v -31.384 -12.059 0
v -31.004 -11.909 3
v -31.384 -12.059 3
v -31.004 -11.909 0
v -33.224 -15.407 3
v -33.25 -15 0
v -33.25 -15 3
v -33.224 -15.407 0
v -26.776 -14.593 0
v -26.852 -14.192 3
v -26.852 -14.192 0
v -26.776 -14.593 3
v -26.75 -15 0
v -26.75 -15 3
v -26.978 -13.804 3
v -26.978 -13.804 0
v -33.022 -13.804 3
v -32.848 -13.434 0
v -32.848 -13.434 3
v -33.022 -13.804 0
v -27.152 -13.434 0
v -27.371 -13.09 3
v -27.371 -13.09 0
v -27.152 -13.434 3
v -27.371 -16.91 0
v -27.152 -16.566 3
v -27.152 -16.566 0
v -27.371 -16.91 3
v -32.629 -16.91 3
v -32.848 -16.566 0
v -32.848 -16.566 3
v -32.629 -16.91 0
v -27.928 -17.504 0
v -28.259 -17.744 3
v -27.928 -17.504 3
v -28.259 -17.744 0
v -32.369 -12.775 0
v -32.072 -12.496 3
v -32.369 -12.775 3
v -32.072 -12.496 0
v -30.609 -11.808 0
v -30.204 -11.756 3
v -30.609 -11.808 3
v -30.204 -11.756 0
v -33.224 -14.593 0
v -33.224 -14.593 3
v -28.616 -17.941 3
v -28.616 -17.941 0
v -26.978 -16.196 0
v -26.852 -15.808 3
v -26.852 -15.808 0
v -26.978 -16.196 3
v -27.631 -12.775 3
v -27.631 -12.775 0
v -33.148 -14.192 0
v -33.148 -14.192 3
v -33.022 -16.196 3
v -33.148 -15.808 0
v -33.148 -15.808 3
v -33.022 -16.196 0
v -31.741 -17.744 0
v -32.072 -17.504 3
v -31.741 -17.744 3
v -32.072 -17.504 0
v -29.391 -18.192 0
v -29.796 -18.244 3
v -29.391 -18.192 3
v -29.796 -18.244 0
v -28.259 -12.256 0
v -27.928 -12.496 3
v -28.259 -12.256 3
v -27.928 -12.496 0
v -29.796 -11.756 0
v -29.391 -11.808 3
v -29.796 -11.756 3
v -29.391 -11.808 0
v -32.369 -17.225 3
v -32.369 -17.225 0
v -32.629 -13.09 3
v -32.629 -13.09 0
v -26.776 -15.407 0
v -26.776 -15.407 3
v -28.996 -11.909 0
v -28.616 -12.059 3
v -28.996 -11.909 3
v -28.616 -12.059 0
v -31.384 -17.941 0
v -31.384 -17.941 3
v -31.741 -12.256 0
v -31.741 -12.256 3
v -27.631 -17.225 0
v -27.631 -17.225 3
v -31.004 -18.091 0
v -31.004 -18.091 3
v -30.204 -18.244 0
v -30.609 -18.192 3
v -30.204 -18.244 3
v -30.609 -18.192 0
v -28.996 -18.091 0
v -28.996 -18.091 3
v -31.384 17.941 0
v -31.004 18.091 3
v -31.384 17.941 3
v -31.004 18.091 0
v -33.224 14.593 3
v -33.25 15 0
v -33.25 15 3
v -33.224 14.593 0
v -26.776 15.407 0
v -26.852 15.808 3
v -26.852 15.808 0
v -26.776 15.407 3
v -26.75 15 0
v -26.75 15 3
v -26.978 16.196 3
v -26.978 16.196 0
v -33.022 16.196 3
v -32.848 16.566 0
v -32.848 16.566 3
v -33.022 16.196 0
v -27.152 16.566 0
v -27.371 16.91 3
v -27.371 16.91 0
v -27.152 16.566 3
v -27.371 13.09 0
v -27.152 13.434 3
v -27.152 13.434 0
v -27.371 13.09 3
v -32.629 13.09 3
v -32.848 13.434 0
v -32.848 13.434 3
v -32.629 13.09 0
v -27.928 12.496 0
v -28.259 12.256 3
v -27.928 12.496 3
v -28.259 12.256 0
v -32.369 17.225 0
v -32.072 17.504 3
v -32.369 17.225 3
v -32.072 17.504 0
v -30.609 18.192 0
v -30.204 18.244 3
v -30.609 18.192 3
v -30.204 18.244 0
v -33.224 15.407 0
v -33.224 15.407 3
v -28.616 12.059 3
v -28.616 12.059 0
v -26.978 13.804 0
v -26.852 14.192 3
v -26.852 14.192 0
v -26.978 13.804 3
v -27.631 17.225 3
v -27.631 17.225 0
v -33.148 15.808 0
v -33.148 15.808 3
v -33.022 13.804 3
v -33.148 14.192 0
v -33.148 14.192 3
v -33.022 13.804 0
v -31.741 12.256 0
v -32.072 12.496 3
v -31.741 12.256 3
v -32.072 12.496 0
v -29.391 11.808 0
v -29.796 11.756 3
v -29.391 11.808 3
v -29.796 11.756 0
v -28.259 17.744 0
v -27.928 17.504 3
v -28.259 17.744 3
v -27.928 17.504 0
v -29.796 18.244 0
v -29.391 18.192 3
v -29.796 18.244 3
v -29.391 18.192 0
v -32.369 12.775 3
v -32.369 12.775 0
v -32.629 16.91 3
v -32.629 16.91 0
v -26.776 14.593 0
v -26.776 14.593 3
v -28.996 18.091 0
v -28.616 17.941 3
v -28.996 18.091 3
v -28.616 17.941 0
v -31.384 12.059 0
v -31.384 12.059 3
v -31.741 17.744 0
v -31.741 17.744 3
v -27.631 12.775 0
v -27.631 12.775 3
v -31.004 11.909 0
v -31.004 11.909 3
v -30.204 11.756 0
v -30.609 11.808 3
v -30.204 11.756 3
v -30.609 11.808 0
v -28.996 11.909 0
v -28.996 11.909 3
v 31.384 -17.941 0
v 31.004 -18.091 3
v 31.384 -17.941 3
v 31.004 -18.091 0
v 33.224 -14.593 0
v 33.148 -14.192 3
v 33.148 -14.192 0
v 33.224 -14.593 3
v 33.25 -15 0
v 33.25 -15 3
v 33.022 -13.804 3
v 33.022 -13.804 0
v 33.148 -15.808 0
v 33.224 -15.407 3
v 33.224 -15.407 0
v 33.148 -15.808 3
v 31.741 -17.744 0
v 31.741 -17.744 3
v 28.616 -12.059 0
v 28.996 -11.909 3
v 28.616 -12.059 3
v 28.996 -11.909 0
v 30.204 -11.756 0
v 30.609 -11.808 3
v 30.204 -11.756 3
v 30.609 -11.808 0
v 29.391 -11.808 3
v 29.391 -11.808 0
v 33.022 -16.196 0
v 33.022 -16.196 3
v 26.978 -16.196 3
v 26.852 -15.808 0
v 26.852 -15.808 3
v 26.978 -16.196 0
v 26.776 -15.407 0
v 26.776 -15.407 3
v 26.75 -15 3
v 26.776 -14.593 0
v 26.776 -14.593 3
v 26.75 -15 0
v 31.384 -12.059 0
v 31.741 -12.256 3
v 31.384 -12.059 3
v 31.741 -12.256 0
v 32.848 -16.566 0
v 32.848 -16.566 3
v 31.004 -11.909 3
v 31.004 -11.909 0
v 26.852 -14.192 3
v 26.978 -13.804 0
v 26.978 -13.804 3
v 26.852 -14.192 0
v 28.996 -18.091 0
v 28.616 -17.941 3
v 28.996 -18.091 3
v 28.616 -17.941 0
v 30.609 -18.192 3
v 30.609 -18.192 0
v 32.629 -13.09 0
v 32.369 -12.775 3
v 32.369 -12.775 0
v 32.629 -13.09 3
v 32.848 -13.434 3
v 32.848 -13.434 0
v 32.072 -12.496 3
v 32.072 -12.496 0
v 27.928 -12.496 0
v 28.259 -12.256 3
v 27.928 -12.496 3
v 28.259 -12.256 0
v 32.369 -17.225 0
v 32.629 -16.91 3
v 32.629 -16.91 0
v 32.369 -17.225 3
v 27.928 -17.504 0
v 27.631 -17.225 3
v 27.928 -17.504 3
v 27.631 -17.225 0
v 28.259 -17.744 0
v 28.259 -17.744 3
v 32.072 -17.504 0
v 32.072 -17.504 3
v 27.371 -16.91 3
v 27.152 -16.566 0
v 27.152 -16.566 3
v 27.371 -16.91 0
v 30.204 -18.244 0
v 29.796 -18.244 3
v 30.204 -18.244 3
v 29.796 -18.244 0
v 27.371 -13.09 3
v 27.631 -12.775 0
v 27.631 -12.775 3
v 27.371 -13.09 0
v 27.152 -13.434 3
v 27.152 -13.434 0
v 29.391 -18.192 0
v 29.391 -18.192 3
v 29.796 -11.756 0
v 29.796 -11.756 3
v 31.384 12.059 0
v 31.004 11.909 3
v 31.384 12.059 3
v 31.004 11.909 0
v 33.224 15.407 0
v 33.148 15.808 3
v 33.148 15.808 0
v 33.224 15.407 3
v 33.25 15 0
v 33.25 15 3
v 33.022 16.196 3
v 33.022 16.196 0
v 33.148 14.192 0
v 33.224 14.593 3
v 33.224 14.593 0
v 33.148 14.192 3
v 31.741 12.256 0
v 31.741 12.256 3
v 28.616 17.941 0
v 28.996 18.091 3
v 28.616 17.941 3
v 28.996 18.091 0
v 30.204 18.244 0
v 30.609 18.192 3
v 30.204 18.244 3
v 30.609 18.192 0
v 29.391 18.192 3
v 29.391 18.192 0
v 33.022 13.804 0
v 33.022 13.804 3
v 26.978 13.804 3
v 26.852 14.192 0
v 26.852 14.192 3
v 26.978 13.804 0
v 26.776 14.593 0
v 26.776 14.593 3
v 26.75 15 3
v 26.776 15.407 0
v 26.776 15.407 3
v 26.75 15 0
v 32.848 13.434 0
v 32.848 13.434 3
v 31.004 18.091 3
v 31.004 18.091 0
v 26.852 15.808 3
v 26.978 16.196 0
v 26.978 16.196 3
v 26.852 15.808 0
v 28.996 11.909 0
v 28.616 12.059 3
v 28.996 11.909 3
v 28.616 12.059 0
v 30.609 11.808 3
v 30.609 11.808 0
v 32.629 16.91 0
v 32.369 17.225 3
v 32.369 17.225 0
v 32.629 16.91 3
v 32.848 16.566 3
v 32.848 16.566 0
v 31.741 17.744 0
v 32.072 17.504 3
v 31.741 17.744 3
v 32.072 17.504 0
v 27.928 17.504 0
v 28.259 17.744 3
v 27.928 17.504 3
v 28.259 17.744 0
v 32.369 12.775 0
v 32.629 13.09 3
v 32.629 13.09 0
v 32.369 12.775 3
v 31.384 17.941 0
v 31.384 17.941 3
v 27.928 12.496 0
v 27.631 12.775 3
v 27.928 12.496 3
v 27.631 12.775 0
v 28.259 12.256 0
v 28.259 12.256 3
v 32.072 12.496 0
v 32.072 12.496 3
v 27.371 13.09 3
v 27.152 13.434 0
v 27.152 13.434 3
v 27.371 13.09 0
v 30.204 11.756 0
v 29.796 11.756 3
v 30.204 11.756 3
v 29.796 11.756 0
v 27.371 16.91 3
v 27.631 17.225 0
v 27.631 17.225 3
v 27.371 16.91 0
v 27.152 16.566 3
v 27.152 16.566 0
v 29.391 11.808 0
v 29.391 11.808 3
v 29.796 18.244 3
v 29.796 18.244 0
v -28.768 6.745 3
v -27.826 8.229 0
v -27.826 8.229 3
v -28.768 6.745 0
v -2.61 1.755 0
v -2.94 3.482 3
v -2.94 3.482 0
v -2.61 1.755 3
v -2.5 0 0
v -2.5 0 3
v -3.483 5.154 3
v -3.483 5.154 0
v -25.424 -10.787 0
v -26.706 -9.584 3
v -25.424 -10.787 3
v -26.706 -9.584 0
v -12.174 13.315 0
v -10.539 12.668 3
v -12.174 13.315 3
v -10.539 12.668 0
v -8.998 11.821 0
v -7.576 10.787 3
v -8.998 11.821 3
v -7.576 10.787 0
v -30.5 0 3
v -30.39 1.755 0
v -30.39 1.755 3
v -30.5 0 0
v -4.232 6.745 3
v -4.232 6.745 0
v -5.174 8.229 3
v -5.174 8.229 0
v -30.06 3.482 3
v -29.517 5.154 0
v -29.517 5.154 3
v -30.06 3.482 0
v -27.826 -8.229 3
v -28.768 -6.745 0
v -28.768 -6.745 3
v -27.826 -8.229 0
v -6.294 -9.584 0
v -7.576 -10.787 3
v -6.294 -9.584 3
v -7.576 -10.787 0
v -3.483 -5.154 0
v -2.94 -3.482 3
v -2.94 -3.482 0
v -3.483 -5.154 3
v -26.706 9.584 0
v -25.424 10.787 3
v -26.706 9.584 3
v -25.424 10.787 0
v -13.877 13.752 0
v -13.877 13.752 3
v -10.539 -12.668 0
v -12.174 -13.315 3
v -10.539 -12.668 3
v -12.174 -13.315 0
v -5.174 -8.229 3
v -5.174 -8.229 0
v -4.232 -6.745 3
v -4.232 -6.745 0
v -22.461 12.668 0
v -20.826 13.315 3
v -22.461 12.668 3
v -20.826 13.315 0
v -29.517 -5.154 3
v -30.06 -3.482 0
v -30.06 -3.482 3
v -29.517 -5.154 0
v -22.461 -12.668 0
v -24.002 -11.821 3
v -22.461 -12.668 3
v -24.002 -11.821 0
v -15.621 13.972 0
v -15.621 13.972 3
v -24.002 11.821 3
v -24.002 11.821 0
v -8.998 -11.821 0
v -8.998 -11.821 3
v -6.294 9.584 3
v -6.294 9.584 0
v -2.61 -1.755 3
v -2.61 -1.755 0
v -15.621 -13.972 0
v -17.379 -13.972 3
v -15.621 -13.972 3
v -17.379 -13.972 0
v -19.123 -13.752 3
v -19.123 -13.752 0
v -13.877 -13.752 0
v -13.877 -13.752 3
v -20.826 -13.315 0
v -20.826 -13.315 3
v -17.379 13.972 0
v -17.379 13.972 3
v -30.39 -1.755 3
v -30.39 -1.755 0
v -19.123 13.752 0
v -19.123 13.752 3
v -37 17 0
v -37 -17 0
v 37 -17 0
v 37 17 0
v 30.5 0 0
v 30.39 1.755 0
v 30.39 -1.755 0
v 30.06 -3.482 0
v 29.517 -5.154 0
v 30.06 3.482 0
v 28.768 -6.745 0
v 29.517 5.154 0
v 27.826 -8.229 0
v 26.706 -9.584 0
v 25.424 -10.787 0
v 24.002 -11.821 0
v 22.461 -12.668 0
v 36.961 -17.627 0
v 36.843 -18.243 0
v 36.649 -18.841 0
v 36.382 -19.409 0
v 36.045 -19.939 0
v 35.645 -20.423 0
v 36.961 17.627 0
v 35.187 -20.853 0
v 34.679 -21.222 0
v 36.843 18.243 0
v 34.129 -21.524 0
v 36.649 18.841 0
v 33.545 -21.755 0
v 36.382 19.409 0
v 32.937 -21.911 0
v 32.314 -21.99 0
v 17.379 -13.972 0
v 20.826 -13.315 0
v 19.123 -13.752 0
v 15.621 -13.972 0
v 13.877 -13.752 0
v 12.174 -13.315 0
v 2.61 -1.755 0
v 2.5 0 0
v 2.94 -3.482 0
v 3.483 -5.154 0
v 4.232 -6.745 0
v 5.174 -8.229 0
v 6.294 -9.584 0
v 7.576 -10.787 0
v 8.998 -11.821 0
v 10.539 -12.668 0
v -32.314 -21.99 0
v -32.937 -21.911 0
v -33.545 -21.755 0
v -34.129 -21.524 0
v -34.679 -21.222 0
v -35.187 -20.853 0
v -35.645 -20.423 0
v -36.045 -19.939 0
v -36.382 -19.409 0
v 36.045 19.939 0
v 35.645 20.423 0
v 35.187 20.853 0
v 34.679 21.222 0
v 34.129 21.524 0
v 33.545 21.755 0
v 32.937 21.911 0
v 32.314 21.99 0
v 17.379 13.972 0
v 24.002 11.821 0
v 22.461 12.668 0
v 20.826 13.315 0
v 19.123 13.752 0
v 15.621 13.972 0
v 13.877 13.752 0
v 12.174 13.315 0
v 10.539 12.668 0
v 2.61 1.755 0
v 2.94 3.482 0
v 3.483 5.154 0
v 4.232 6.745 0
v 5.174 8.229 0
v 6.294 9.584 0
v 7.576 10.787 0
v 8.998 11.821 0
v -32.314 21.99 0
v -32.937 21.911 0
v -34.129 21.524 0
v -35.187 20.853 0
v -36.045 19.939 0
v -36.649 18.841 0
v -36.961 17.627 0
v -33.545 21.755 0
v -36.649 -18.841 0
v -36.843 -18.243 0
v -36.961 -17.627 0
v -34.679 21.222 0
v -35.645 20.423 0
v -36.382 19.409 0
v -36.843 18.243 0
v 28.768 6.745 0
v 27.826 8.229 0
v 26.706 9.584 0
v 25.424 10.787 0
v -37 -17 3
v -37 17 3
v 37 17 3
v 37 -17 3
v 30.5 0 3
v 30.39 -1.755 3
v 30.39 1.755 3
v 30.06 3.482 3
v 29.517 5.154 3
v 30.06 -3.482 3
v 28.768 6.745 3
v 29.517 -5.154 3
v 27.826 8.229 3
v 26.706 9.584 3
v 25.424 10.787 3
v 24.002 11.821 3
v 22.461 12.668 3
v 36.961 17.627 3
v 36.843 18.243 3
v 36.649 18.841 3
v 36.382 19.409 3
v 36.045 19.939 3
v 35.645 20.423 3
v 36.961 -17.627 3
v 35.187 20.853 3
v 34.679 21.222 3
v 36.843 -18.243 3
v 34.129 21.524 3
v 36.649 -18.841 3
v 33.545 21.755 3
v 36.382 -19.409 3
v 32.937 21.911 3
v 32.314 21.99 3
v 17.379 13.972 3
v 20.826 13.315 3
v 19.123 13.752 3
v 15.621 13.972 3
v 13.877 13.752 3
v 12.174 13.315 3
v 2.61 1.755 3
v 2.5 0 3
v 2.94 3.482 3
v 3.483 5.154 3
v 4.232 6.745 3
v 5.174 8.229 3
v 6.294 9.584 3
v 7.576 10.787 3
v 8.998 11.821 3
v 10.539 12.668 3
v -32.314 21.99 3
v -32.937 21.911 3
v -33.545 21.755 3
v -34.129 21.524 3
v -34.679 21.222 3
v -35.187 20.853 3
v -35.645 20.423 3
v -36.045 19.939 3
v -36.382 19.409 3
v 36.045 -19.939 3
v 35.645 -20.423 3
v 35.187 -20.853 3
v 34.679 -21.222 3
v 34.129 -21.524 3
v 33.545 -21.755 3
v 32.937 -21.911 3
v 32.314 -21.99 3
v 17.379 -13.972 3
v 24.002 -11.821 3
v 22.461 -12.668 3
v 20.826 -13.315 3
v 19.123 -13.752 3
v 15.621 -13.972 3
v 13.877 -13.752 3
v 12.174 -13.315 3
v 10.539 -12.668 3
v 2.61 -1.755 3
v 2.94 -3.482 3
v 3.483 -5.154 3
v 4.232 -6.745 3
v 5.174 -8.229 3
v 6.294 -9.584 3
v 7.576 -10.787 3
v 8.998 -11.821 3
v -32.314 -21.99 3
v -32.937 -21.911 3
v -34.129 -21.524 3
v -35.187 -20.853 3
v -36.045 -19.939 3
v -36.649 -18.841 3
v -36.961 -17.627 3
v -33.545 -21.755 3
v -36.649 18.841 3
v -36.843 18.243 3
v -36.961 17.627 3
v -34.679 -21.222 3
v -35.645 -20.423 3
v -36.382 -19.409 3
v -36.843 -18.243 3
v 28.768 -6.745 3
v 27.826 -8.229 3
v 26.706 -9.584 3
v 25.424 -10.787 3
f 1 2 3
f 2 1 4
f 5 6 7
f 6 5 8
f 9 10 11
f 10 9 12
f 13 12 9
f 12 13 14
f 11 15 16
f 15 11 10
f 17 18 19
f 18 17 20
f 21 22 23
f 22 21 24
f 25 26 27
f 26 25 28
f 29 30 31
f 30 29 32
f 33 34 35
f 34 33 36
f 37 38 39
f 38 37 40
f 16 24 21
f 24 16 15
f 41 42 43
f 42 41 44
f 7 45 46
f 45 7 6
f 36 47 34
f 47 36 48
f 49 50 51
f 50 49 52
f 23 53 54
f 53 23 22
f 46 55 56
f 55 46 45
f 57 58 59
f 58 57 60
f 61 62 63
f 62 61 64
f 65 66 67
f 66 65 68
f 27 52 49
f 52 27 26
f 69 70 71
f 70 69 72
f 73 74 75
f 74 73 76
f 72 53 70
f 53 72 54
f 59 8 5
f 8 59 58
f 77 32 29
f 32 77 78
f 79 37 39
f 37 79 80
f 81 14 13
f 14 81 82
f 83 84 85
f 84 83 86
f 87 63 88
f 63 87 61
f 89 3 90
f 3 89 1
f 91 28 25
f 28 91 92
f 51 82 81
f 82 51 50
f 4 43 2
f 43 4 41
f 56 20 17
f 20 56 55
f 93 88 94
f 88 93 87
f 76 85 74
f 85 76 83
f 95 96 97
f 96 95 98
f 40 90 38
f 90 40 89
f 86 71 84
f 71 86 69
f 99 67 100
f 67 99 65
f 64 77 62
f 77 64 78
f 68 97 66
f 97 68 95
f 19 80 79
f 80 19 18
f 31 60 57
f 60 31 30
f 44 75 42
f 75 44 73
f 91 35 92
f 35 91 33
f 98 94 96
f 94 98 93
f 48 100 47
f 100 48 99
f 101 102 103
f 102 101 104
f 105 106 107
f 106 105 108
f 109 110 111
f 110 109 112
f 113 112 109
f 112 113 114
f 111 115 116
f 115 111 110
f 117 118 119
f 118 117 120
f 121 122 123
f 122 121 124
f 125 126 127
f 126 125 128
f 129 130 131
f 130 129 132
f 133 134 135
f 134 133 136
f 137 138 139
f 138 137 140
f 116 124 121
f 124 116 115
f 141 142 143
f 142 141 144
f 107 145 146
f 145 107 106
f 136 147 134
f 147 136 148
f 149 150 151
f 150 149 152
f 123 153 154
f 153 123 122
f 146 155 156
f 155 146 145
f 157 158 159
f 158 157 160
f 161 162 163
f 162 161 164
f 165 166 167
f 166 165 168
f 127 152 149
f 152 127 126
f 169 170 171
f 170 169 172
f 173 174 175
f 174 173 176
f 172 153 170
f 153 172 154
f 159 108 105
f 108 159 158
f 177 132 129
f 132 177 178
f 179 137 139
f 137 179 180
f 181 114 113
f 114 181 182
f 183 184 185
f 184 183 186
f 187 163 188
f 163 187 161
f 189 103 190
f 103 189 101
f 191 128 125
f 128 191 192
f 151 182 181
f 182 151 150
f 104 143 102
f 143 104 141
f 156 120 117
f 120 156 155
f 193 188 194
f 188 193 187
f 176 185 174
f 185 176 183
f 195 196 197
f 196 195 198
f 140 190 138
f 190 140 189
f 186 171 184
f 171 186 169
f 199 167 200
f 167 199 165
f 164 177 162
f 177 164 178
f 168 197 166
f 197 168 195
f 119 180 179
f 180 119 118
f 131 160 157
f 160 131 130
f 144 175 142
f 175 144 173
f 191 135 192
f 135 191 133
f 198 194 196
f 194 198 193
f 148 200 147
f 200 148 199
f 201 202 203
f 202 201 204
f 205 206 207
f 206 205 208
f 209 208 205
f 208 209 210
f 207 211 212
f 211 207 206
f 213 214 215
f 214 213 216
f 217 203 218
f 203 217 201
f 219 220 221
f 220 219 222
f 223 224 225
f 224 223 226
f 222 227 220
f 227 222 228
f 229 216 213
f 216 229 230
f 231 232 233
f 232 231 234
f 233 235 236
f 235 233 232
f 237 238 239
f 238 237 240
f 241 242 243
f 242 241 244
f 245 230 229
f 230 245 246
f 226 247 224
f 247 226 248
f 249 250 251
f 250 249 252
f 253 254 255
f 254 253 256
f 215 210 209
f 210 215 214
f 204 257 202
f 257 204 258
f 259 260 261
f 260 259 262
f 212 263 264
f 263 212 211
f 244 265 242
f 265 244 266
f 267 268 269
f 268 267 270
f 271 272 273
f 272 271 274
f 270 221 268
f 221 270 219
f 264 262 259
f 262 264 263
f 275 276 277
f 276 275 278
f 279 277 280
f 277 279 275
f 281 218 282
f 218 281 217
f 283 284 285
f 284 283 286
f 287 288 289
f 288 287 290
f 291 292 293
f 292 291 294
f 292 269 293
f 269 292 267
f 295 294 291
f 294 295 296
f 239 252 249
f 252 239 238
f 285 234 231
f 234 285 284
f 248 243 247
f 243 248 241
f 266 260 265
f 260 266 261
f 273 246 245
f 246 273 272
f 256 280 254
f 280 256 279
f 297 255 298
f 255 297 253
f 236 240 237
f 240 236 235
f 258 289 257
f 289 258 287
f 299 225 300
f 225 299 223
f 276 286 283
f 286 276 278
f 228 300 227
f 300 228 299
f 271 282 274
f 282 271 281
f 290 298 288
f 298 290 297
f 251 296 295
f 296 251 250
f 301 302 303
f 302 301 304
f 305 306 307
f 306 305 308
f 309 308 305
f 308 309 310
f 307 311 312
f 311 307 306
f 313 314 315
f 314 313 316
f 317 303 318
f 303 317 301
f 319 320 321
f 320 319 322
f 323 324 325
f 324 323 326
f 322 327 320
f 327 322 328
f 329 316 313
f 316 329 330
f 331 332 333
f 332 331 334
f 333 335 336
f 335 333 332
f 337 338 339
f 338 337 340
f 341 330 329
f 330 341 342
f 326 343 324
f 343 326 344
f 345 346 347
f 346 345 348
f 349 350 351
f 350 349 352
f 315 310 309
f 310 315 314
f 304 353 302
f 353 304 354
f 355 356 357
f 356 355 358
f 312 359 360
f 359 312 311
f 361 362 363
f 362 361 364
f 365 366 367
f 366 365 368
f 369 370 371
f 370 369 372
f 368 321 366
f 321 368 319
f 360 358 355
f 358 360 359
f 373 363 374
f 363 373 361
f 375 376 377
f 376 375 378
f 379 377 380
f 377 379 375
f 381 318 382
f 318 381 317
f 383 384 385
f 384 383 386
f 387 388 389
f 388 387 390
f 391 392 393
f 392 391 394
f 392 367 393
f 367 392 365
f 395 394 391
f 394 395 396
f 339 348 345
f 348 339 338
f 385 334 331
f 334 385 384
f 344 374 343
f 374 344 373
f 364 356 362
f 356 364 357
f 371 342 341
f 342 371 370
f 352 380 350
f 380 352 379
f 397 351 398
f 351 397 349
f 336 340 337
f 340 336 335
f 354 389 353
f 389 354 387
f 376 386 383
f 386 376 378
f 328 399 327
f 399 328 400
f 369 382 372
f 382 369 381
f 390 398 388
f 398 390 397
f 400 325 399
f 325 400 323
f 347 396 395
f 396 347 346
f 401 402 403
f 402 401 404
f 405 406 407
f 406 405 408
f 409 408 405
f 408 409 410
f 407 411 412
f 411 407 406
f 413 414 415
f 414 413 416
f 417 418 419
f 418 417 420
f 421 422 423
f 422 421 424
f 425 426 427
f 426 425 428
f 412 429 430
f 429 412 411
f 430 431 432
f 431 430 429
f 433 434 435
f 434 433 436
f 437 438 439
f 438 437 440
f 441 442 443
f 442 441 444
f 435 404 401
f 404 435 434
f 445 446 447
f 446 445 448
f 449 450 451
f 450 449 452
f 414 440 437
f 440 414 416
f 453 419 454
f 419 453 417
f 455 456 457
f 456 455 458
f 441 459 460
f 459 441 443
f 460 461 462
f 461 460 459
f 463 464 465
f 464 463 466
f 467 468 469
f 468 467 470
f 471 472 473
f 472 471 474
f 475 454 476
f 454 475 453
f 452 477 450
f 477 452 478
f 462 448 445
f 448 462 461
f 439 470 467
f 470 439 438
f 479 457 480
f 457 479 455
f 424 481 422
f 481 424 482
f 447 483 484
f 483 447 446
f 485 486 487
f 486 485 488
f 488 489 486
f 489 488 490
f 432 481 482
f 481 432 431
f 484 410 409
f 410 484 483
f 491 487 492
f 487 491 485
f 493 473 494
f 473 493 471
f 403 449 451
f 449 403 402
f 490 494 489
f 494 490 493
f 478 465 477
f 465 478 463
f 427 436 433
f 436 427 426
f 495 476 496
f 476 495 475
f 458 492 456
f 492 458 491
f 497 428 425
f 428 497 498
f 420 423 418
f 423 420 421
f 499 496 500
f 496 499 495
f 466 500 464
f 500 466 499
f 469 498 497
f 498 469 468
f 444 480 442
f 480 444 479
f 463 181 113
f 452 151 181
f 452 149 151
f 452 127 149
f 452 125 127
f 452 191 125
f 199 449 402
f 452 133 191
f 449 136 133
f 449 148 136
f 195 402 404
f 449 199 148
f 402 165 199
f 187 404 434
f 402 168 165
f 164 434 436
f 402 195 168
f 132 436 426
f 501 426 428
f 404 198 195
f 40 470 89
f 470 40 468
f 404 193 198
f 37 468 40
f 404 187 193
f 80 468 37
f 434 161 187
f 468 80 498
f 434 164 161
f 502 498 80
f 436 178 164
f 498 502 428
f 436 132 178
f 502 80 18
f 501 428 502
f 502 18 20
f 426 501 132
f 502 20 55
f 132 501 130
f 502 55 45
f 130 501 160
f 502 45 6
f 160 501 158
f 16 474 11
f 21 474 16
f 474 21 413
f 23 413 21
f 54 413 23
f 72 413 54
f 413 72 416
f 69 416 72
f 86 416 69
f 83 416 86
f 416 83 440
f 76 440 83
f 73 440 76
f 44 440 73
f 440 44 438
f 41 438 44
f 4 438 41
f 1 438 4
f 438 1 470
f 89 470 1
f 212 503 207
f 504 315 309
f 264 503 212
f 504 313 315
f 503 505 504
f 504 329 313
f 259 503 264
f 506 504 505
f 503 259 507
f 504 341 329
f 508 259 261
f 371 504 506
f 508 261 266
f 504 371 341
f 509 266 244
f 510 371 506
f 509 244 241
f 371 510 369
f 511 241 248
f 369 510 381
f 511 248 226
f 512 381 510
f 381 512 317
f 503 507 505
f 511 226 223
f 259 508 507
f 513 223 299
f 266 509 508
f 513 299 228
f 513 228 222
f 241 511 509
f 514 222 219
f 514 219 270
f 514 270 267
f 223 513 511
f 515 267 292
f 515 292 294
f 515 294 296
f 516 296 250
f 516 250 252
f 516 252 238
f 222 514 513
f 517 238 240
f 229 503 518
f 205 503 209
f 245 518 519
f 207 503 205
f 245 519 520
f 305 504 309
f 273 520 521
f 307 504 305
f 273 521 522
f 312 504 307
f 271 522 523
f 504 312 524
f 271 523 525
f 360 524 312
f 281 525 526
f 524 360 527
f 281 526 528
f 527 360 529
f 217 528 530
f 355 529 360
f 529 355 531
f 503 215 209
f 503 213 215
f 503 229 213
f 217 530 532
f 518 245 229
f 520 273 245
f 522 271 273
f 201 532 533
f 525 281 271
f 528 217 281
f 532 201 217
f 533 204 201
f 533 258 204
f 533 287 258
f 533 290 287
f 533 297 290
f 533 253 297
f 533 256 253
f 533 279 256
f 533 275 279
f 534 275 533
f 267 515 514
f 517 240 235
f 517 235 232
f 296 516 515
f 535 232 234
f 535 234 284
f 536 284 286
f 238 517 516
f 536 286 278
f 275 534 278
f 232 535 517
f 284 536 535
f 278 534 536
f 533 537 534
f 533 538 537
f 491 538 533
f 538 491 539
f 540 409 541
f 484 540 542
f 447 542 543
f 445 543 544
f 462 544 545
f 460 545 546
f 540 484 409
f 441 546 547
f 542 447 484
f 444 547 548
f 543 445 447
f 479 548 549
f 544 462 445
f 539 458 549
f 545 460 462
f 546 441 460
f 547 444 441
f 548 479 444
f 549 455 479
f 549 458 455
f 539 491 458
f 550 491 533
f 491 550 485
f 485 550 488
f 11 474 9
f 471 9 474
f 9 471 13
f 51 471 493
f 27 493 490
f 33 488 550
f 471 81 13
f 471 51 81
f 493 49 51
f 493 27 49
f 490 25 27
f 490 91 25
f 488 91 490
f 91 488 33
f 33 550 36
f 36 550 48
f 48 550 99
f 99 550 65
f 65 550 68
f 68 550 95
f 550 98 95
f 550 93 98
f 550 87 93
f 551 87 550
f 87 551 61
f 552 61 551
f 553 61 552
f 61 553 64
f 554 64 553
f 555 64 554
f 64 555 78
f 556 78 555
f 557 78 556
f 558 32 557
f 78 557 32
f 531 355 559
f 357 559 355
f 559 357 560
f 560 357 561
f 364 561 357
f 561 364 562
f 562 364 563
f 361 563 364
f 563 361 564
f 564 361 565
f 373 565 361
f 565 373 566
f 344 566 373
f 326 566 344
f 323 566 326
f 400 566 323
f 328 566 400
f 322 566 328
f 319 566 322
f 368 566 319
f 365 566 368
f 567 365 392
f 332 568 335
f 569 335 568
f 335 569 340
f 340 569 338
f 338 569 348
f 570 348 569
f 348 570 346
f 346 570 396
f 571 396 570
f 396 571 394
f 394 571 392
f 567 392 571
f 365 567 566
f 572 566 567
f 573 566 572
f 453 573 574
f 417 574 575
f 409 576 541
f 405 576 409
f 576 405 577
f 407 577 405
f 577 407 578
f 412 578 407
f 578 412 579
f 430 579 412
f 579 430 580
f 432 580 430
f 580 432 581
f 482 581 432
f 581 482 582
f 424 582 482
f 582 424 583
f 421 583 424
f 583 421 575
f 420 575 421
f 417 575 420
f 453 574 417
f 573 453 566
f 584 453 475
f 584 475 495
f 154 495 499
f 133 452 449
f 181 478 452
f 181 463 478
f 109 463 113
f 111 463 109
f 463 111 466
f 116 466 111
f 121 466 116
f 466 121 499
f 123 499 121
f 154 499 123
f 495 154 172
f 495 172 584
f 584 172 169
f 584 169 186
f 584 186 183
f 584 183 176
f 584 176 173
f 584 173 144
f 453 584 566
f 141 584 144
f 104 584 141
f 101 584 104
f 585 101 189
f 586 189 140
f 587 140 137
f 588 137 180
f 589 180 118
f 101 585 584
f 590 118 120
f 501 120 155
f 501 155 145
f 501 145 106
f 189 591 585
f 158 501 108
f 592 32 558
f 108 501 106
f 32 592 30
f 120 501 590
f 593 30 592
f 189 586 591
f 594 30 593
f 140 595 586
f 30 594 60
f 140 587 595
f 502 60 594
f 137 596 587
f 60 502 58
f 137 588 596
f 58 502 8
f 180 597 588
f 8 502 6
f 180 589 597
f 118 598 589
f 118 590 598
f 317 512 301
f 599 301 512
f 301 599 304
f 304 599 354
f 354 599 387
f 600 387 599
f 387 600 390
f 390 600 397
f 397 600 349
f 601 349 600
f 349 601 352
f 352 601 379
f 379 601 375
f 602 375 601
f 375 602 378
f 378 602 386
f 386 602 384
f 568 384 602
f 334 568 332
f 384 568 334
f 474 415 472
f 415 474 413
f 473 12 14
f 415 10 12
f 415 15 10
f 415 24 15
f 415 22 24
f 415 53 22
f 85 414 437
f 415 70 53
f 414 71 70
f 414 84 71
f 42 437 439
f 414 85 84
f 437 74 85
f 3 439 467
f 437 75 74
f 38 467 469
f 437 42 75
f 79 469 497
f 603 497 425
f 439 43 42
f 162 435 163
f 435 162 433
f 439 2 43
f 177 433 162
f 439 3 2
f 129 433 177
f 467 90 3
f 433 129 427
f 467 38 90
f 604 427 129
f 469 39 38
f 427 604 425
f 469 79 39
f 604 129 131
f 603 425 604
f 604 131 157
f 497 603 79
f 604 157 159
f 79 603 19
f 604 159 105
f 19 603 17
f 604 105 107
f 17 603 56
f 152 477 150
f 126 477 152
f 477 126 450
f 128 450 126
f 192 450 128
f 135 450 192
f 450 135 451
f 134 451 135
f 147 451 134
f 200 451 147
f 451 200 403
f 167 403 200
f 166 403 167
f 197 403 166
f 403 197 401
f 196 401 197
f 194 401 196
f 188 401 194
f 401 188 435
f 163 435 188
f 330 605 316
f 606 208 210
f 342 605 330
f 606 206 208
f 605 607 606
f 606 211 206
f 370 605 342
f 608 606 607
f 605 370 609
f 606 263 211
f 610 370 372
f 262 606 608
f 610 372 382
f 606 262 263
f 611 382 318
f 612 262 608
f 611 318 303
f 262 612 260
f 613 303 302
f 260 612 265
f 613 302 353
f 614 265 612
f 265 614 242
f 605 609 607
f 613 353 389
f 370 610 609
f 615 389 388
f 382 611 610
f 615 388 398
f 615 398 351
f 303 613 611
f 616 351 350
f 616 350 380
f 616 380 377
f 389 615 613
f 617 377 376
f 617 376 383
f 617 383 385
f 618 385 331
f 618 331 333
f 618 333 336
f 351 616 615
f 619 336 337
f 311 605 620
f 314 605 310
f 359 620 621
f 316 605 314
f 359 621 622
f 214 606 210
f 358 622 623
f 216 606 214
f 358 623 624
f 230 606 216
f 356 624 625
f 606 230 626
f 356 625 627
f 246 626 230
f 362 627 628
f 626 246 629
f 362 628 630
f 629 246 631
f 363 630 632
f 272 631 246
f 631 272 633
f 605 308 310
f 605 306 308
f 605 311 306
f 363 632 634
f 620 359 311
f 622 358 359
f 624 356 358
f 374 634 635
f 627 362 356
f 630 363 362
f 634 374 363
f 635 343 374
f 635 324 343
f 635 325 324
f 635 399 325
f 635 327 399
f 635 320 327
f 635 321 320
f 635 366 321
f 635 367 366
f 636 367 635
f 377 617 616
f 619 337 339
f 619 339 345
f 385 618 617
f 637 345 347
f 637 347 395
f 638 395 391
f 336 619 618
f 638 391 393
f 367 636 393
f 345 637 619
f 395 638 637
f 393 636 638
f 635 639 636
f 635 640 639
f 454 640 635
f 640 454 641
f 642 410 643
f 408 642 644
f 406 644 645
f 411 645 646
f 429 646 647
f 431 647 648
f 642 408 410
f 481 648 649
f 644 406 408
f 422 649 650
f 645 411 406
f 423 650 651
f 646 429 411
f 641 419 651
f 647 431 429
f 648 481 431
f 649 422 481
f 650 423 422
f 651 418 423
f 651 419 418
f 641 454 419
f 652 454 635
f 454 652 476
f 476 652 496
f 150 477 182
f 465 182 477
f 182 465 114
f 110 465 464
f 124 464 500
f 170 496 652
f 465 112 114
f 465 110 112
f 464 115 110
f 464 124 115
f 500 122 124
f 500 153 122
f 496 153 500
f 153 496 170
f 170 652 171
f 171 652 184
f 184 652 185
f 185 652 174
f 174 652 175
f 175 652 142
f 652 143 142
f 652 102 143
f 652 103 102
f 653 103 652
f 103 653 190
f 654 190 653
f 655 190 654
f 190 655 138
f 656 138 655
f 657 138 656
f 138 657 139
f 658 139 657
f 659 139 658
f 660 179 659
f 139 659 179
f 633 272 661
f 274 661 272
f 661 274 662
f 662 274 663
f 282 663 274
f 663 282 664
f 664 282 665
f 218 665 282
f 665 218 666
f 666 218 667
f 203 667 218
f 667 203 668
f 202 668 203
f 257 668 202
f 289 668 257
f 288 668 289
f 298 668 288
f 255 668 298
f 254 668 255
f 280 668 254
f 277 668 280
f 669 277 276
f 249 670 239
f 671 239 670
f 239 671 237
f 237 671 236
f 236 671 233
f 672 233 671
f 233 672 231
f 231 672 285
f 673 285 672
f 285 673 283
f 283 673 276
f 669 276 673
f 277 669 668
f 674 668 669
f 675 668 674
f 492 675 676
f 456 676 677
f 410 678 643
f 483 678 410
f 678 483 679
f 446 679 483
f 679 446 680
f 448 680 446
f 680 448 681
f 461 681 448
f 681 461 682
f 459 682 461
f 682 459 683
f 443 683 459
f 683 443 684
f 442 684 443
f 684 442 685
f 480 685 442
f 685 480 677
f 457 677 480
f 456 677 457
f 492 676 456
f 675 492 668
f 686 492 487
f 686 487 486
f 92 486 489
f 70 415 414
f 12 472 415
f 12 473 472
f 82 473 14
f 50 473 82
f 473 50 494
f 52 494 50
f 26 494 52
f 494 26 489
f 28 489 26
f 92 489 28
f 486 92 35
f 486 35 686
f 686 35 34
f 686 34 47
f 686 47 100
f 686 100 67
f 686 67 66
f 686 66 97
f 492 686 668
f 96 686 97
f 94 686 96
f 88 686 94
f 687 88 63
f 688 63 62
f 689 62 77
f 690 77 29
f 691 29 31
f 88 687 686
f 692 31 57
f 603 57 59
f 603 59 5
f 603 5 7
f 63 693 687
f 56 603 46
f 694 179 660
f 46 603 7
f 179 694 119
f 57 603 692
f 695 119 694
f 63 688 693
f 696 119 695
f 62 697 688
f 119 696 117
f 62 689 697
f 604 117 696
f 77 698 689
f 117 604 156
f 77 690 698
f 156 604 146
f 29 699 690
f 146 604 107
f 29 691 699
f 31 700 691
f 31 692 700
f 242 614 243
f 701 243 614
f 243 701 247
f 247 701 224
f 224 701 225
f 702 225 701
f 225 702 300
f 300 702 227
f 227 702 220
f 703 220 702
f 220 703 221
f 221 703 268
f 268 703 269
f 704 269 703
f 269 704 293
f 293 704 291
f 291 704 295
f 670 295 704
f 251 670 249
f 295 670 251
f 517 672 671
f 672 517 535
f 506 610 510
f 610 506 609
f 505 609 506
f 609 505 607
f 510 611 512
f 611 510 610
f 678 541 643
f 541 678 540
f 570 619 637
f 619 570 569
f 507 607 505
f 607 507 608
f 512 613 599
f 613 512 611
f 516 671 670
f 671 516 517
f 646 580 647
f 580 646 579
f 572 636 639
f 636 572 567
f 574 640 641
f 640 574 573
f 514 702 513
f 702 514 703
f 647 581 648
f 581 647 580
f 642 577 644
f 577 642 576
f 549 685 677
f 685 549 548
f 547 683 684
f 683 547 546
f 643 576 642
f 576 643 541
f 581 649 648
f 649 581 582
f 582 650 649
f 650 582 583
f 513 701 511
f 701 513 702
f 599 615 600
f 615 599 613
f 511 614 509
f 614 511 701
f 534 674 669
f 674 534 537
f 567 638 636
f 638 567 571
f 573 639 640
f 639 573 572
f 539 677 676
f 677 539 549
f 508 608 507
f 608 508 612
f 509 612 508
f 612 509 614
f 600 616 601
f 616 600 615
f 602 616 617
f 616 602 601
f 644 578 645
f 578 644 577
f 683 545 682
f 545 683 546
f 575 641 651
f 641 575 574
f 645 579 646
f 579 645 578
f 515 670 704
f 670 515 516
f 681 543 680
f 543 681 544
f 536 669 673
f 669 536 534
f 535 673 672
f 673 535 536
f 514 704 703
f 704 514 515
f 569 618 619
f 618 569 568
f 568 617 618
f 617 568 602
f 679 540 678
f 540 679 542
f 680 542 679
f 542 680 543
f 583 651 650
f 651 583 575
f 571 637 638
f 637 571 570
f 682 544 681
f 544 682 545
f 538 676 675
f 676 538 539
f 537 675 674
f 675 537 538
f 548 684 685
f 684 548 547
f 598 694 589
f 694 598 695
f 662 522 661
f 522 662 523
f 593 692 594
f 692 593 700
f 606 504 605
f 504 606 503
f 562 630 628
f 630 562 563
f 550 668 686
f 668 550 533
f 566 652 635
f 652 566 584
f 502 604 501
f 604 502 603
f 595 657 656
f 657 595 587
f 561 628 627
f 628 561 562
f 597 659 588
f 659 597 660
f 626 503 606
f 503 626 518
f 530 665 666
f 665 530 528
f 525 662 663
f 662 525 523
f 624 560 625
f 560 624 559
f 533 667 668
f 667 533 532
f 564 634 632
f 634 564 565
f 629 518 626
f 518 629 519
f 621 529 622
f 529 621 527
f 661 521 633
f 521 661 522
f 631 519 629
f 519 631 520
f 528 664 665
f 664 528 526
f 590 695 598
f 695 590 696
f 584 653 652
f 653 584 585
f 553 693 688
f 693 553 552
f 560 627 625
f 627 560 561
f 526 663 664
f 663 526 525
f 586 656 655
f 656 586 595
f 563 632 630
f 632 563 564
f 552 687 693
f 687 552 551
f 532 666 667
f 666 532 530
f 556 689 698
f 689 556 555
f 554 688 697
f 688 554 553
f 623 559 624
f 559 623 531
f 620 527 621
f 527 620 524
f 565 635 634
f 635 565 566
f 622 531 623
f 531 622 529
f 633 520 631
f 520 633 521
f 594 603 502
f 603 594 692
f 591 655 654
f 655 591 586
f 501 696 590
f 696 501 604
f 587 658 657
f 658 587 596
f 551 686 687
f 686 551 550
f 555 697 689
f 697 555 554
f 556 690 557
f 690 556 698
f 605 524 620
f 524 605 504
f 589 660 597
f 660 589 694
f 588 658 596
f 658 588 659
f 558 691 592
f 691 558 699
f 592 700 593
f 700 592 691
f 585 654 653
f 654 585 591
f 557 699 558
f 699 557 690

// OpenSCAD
$fn = 50;


difference() {
	union() {
		hull() {
			translate(v = [-32.0000000000, 17.0000000000, 0]) {
				cylinder(h = 3, r = 5);
			}
			translate(v = [32.0000000000, 17.0000000000, 0]) {
				cylinder(h = 3, r = 5);
			}
			translate(v = [-32.0000000000, -17.0000000000, 0]) {
				cylinder(h = 3, r = 5);
			}
			translate(v = [32.0000000000, -17.0000000000, 0]) {
				cylinder(h = 3, r = 5);
			}
		}
	}
	union() {
		#translate(v = [-30.0000000000, -15.0000000000, -100.0000000000]) {
			cylinder(h = 200, r = 3.2500000000);
		}
		#translate(v = [-30.0000000000, 15.0000000000, -100.0000000000]) {
			cylinder(h = 200, r = 3.2500000000);
		}
		#translate(v = [30.0000000000, -15.0000000000, -100.0000000000]) {
			cylinder(h = 200, r = 3.2500000000);
		}
		#translate(v = [30.0000000000, 15.0000000000, -100.0000000000]) {
			cylinder(h = 200, r = 3.2500000000);
		}
		#translate(v = [-16.5000000000, 0, 0]) {
			cylinder(h = 3, r = 14.0000000000);
		}
		#translate(v = [16.5000000000, 0, 0]) {
			cylinder(h = 3, r = 14.0000000000);
		}
	}
}
